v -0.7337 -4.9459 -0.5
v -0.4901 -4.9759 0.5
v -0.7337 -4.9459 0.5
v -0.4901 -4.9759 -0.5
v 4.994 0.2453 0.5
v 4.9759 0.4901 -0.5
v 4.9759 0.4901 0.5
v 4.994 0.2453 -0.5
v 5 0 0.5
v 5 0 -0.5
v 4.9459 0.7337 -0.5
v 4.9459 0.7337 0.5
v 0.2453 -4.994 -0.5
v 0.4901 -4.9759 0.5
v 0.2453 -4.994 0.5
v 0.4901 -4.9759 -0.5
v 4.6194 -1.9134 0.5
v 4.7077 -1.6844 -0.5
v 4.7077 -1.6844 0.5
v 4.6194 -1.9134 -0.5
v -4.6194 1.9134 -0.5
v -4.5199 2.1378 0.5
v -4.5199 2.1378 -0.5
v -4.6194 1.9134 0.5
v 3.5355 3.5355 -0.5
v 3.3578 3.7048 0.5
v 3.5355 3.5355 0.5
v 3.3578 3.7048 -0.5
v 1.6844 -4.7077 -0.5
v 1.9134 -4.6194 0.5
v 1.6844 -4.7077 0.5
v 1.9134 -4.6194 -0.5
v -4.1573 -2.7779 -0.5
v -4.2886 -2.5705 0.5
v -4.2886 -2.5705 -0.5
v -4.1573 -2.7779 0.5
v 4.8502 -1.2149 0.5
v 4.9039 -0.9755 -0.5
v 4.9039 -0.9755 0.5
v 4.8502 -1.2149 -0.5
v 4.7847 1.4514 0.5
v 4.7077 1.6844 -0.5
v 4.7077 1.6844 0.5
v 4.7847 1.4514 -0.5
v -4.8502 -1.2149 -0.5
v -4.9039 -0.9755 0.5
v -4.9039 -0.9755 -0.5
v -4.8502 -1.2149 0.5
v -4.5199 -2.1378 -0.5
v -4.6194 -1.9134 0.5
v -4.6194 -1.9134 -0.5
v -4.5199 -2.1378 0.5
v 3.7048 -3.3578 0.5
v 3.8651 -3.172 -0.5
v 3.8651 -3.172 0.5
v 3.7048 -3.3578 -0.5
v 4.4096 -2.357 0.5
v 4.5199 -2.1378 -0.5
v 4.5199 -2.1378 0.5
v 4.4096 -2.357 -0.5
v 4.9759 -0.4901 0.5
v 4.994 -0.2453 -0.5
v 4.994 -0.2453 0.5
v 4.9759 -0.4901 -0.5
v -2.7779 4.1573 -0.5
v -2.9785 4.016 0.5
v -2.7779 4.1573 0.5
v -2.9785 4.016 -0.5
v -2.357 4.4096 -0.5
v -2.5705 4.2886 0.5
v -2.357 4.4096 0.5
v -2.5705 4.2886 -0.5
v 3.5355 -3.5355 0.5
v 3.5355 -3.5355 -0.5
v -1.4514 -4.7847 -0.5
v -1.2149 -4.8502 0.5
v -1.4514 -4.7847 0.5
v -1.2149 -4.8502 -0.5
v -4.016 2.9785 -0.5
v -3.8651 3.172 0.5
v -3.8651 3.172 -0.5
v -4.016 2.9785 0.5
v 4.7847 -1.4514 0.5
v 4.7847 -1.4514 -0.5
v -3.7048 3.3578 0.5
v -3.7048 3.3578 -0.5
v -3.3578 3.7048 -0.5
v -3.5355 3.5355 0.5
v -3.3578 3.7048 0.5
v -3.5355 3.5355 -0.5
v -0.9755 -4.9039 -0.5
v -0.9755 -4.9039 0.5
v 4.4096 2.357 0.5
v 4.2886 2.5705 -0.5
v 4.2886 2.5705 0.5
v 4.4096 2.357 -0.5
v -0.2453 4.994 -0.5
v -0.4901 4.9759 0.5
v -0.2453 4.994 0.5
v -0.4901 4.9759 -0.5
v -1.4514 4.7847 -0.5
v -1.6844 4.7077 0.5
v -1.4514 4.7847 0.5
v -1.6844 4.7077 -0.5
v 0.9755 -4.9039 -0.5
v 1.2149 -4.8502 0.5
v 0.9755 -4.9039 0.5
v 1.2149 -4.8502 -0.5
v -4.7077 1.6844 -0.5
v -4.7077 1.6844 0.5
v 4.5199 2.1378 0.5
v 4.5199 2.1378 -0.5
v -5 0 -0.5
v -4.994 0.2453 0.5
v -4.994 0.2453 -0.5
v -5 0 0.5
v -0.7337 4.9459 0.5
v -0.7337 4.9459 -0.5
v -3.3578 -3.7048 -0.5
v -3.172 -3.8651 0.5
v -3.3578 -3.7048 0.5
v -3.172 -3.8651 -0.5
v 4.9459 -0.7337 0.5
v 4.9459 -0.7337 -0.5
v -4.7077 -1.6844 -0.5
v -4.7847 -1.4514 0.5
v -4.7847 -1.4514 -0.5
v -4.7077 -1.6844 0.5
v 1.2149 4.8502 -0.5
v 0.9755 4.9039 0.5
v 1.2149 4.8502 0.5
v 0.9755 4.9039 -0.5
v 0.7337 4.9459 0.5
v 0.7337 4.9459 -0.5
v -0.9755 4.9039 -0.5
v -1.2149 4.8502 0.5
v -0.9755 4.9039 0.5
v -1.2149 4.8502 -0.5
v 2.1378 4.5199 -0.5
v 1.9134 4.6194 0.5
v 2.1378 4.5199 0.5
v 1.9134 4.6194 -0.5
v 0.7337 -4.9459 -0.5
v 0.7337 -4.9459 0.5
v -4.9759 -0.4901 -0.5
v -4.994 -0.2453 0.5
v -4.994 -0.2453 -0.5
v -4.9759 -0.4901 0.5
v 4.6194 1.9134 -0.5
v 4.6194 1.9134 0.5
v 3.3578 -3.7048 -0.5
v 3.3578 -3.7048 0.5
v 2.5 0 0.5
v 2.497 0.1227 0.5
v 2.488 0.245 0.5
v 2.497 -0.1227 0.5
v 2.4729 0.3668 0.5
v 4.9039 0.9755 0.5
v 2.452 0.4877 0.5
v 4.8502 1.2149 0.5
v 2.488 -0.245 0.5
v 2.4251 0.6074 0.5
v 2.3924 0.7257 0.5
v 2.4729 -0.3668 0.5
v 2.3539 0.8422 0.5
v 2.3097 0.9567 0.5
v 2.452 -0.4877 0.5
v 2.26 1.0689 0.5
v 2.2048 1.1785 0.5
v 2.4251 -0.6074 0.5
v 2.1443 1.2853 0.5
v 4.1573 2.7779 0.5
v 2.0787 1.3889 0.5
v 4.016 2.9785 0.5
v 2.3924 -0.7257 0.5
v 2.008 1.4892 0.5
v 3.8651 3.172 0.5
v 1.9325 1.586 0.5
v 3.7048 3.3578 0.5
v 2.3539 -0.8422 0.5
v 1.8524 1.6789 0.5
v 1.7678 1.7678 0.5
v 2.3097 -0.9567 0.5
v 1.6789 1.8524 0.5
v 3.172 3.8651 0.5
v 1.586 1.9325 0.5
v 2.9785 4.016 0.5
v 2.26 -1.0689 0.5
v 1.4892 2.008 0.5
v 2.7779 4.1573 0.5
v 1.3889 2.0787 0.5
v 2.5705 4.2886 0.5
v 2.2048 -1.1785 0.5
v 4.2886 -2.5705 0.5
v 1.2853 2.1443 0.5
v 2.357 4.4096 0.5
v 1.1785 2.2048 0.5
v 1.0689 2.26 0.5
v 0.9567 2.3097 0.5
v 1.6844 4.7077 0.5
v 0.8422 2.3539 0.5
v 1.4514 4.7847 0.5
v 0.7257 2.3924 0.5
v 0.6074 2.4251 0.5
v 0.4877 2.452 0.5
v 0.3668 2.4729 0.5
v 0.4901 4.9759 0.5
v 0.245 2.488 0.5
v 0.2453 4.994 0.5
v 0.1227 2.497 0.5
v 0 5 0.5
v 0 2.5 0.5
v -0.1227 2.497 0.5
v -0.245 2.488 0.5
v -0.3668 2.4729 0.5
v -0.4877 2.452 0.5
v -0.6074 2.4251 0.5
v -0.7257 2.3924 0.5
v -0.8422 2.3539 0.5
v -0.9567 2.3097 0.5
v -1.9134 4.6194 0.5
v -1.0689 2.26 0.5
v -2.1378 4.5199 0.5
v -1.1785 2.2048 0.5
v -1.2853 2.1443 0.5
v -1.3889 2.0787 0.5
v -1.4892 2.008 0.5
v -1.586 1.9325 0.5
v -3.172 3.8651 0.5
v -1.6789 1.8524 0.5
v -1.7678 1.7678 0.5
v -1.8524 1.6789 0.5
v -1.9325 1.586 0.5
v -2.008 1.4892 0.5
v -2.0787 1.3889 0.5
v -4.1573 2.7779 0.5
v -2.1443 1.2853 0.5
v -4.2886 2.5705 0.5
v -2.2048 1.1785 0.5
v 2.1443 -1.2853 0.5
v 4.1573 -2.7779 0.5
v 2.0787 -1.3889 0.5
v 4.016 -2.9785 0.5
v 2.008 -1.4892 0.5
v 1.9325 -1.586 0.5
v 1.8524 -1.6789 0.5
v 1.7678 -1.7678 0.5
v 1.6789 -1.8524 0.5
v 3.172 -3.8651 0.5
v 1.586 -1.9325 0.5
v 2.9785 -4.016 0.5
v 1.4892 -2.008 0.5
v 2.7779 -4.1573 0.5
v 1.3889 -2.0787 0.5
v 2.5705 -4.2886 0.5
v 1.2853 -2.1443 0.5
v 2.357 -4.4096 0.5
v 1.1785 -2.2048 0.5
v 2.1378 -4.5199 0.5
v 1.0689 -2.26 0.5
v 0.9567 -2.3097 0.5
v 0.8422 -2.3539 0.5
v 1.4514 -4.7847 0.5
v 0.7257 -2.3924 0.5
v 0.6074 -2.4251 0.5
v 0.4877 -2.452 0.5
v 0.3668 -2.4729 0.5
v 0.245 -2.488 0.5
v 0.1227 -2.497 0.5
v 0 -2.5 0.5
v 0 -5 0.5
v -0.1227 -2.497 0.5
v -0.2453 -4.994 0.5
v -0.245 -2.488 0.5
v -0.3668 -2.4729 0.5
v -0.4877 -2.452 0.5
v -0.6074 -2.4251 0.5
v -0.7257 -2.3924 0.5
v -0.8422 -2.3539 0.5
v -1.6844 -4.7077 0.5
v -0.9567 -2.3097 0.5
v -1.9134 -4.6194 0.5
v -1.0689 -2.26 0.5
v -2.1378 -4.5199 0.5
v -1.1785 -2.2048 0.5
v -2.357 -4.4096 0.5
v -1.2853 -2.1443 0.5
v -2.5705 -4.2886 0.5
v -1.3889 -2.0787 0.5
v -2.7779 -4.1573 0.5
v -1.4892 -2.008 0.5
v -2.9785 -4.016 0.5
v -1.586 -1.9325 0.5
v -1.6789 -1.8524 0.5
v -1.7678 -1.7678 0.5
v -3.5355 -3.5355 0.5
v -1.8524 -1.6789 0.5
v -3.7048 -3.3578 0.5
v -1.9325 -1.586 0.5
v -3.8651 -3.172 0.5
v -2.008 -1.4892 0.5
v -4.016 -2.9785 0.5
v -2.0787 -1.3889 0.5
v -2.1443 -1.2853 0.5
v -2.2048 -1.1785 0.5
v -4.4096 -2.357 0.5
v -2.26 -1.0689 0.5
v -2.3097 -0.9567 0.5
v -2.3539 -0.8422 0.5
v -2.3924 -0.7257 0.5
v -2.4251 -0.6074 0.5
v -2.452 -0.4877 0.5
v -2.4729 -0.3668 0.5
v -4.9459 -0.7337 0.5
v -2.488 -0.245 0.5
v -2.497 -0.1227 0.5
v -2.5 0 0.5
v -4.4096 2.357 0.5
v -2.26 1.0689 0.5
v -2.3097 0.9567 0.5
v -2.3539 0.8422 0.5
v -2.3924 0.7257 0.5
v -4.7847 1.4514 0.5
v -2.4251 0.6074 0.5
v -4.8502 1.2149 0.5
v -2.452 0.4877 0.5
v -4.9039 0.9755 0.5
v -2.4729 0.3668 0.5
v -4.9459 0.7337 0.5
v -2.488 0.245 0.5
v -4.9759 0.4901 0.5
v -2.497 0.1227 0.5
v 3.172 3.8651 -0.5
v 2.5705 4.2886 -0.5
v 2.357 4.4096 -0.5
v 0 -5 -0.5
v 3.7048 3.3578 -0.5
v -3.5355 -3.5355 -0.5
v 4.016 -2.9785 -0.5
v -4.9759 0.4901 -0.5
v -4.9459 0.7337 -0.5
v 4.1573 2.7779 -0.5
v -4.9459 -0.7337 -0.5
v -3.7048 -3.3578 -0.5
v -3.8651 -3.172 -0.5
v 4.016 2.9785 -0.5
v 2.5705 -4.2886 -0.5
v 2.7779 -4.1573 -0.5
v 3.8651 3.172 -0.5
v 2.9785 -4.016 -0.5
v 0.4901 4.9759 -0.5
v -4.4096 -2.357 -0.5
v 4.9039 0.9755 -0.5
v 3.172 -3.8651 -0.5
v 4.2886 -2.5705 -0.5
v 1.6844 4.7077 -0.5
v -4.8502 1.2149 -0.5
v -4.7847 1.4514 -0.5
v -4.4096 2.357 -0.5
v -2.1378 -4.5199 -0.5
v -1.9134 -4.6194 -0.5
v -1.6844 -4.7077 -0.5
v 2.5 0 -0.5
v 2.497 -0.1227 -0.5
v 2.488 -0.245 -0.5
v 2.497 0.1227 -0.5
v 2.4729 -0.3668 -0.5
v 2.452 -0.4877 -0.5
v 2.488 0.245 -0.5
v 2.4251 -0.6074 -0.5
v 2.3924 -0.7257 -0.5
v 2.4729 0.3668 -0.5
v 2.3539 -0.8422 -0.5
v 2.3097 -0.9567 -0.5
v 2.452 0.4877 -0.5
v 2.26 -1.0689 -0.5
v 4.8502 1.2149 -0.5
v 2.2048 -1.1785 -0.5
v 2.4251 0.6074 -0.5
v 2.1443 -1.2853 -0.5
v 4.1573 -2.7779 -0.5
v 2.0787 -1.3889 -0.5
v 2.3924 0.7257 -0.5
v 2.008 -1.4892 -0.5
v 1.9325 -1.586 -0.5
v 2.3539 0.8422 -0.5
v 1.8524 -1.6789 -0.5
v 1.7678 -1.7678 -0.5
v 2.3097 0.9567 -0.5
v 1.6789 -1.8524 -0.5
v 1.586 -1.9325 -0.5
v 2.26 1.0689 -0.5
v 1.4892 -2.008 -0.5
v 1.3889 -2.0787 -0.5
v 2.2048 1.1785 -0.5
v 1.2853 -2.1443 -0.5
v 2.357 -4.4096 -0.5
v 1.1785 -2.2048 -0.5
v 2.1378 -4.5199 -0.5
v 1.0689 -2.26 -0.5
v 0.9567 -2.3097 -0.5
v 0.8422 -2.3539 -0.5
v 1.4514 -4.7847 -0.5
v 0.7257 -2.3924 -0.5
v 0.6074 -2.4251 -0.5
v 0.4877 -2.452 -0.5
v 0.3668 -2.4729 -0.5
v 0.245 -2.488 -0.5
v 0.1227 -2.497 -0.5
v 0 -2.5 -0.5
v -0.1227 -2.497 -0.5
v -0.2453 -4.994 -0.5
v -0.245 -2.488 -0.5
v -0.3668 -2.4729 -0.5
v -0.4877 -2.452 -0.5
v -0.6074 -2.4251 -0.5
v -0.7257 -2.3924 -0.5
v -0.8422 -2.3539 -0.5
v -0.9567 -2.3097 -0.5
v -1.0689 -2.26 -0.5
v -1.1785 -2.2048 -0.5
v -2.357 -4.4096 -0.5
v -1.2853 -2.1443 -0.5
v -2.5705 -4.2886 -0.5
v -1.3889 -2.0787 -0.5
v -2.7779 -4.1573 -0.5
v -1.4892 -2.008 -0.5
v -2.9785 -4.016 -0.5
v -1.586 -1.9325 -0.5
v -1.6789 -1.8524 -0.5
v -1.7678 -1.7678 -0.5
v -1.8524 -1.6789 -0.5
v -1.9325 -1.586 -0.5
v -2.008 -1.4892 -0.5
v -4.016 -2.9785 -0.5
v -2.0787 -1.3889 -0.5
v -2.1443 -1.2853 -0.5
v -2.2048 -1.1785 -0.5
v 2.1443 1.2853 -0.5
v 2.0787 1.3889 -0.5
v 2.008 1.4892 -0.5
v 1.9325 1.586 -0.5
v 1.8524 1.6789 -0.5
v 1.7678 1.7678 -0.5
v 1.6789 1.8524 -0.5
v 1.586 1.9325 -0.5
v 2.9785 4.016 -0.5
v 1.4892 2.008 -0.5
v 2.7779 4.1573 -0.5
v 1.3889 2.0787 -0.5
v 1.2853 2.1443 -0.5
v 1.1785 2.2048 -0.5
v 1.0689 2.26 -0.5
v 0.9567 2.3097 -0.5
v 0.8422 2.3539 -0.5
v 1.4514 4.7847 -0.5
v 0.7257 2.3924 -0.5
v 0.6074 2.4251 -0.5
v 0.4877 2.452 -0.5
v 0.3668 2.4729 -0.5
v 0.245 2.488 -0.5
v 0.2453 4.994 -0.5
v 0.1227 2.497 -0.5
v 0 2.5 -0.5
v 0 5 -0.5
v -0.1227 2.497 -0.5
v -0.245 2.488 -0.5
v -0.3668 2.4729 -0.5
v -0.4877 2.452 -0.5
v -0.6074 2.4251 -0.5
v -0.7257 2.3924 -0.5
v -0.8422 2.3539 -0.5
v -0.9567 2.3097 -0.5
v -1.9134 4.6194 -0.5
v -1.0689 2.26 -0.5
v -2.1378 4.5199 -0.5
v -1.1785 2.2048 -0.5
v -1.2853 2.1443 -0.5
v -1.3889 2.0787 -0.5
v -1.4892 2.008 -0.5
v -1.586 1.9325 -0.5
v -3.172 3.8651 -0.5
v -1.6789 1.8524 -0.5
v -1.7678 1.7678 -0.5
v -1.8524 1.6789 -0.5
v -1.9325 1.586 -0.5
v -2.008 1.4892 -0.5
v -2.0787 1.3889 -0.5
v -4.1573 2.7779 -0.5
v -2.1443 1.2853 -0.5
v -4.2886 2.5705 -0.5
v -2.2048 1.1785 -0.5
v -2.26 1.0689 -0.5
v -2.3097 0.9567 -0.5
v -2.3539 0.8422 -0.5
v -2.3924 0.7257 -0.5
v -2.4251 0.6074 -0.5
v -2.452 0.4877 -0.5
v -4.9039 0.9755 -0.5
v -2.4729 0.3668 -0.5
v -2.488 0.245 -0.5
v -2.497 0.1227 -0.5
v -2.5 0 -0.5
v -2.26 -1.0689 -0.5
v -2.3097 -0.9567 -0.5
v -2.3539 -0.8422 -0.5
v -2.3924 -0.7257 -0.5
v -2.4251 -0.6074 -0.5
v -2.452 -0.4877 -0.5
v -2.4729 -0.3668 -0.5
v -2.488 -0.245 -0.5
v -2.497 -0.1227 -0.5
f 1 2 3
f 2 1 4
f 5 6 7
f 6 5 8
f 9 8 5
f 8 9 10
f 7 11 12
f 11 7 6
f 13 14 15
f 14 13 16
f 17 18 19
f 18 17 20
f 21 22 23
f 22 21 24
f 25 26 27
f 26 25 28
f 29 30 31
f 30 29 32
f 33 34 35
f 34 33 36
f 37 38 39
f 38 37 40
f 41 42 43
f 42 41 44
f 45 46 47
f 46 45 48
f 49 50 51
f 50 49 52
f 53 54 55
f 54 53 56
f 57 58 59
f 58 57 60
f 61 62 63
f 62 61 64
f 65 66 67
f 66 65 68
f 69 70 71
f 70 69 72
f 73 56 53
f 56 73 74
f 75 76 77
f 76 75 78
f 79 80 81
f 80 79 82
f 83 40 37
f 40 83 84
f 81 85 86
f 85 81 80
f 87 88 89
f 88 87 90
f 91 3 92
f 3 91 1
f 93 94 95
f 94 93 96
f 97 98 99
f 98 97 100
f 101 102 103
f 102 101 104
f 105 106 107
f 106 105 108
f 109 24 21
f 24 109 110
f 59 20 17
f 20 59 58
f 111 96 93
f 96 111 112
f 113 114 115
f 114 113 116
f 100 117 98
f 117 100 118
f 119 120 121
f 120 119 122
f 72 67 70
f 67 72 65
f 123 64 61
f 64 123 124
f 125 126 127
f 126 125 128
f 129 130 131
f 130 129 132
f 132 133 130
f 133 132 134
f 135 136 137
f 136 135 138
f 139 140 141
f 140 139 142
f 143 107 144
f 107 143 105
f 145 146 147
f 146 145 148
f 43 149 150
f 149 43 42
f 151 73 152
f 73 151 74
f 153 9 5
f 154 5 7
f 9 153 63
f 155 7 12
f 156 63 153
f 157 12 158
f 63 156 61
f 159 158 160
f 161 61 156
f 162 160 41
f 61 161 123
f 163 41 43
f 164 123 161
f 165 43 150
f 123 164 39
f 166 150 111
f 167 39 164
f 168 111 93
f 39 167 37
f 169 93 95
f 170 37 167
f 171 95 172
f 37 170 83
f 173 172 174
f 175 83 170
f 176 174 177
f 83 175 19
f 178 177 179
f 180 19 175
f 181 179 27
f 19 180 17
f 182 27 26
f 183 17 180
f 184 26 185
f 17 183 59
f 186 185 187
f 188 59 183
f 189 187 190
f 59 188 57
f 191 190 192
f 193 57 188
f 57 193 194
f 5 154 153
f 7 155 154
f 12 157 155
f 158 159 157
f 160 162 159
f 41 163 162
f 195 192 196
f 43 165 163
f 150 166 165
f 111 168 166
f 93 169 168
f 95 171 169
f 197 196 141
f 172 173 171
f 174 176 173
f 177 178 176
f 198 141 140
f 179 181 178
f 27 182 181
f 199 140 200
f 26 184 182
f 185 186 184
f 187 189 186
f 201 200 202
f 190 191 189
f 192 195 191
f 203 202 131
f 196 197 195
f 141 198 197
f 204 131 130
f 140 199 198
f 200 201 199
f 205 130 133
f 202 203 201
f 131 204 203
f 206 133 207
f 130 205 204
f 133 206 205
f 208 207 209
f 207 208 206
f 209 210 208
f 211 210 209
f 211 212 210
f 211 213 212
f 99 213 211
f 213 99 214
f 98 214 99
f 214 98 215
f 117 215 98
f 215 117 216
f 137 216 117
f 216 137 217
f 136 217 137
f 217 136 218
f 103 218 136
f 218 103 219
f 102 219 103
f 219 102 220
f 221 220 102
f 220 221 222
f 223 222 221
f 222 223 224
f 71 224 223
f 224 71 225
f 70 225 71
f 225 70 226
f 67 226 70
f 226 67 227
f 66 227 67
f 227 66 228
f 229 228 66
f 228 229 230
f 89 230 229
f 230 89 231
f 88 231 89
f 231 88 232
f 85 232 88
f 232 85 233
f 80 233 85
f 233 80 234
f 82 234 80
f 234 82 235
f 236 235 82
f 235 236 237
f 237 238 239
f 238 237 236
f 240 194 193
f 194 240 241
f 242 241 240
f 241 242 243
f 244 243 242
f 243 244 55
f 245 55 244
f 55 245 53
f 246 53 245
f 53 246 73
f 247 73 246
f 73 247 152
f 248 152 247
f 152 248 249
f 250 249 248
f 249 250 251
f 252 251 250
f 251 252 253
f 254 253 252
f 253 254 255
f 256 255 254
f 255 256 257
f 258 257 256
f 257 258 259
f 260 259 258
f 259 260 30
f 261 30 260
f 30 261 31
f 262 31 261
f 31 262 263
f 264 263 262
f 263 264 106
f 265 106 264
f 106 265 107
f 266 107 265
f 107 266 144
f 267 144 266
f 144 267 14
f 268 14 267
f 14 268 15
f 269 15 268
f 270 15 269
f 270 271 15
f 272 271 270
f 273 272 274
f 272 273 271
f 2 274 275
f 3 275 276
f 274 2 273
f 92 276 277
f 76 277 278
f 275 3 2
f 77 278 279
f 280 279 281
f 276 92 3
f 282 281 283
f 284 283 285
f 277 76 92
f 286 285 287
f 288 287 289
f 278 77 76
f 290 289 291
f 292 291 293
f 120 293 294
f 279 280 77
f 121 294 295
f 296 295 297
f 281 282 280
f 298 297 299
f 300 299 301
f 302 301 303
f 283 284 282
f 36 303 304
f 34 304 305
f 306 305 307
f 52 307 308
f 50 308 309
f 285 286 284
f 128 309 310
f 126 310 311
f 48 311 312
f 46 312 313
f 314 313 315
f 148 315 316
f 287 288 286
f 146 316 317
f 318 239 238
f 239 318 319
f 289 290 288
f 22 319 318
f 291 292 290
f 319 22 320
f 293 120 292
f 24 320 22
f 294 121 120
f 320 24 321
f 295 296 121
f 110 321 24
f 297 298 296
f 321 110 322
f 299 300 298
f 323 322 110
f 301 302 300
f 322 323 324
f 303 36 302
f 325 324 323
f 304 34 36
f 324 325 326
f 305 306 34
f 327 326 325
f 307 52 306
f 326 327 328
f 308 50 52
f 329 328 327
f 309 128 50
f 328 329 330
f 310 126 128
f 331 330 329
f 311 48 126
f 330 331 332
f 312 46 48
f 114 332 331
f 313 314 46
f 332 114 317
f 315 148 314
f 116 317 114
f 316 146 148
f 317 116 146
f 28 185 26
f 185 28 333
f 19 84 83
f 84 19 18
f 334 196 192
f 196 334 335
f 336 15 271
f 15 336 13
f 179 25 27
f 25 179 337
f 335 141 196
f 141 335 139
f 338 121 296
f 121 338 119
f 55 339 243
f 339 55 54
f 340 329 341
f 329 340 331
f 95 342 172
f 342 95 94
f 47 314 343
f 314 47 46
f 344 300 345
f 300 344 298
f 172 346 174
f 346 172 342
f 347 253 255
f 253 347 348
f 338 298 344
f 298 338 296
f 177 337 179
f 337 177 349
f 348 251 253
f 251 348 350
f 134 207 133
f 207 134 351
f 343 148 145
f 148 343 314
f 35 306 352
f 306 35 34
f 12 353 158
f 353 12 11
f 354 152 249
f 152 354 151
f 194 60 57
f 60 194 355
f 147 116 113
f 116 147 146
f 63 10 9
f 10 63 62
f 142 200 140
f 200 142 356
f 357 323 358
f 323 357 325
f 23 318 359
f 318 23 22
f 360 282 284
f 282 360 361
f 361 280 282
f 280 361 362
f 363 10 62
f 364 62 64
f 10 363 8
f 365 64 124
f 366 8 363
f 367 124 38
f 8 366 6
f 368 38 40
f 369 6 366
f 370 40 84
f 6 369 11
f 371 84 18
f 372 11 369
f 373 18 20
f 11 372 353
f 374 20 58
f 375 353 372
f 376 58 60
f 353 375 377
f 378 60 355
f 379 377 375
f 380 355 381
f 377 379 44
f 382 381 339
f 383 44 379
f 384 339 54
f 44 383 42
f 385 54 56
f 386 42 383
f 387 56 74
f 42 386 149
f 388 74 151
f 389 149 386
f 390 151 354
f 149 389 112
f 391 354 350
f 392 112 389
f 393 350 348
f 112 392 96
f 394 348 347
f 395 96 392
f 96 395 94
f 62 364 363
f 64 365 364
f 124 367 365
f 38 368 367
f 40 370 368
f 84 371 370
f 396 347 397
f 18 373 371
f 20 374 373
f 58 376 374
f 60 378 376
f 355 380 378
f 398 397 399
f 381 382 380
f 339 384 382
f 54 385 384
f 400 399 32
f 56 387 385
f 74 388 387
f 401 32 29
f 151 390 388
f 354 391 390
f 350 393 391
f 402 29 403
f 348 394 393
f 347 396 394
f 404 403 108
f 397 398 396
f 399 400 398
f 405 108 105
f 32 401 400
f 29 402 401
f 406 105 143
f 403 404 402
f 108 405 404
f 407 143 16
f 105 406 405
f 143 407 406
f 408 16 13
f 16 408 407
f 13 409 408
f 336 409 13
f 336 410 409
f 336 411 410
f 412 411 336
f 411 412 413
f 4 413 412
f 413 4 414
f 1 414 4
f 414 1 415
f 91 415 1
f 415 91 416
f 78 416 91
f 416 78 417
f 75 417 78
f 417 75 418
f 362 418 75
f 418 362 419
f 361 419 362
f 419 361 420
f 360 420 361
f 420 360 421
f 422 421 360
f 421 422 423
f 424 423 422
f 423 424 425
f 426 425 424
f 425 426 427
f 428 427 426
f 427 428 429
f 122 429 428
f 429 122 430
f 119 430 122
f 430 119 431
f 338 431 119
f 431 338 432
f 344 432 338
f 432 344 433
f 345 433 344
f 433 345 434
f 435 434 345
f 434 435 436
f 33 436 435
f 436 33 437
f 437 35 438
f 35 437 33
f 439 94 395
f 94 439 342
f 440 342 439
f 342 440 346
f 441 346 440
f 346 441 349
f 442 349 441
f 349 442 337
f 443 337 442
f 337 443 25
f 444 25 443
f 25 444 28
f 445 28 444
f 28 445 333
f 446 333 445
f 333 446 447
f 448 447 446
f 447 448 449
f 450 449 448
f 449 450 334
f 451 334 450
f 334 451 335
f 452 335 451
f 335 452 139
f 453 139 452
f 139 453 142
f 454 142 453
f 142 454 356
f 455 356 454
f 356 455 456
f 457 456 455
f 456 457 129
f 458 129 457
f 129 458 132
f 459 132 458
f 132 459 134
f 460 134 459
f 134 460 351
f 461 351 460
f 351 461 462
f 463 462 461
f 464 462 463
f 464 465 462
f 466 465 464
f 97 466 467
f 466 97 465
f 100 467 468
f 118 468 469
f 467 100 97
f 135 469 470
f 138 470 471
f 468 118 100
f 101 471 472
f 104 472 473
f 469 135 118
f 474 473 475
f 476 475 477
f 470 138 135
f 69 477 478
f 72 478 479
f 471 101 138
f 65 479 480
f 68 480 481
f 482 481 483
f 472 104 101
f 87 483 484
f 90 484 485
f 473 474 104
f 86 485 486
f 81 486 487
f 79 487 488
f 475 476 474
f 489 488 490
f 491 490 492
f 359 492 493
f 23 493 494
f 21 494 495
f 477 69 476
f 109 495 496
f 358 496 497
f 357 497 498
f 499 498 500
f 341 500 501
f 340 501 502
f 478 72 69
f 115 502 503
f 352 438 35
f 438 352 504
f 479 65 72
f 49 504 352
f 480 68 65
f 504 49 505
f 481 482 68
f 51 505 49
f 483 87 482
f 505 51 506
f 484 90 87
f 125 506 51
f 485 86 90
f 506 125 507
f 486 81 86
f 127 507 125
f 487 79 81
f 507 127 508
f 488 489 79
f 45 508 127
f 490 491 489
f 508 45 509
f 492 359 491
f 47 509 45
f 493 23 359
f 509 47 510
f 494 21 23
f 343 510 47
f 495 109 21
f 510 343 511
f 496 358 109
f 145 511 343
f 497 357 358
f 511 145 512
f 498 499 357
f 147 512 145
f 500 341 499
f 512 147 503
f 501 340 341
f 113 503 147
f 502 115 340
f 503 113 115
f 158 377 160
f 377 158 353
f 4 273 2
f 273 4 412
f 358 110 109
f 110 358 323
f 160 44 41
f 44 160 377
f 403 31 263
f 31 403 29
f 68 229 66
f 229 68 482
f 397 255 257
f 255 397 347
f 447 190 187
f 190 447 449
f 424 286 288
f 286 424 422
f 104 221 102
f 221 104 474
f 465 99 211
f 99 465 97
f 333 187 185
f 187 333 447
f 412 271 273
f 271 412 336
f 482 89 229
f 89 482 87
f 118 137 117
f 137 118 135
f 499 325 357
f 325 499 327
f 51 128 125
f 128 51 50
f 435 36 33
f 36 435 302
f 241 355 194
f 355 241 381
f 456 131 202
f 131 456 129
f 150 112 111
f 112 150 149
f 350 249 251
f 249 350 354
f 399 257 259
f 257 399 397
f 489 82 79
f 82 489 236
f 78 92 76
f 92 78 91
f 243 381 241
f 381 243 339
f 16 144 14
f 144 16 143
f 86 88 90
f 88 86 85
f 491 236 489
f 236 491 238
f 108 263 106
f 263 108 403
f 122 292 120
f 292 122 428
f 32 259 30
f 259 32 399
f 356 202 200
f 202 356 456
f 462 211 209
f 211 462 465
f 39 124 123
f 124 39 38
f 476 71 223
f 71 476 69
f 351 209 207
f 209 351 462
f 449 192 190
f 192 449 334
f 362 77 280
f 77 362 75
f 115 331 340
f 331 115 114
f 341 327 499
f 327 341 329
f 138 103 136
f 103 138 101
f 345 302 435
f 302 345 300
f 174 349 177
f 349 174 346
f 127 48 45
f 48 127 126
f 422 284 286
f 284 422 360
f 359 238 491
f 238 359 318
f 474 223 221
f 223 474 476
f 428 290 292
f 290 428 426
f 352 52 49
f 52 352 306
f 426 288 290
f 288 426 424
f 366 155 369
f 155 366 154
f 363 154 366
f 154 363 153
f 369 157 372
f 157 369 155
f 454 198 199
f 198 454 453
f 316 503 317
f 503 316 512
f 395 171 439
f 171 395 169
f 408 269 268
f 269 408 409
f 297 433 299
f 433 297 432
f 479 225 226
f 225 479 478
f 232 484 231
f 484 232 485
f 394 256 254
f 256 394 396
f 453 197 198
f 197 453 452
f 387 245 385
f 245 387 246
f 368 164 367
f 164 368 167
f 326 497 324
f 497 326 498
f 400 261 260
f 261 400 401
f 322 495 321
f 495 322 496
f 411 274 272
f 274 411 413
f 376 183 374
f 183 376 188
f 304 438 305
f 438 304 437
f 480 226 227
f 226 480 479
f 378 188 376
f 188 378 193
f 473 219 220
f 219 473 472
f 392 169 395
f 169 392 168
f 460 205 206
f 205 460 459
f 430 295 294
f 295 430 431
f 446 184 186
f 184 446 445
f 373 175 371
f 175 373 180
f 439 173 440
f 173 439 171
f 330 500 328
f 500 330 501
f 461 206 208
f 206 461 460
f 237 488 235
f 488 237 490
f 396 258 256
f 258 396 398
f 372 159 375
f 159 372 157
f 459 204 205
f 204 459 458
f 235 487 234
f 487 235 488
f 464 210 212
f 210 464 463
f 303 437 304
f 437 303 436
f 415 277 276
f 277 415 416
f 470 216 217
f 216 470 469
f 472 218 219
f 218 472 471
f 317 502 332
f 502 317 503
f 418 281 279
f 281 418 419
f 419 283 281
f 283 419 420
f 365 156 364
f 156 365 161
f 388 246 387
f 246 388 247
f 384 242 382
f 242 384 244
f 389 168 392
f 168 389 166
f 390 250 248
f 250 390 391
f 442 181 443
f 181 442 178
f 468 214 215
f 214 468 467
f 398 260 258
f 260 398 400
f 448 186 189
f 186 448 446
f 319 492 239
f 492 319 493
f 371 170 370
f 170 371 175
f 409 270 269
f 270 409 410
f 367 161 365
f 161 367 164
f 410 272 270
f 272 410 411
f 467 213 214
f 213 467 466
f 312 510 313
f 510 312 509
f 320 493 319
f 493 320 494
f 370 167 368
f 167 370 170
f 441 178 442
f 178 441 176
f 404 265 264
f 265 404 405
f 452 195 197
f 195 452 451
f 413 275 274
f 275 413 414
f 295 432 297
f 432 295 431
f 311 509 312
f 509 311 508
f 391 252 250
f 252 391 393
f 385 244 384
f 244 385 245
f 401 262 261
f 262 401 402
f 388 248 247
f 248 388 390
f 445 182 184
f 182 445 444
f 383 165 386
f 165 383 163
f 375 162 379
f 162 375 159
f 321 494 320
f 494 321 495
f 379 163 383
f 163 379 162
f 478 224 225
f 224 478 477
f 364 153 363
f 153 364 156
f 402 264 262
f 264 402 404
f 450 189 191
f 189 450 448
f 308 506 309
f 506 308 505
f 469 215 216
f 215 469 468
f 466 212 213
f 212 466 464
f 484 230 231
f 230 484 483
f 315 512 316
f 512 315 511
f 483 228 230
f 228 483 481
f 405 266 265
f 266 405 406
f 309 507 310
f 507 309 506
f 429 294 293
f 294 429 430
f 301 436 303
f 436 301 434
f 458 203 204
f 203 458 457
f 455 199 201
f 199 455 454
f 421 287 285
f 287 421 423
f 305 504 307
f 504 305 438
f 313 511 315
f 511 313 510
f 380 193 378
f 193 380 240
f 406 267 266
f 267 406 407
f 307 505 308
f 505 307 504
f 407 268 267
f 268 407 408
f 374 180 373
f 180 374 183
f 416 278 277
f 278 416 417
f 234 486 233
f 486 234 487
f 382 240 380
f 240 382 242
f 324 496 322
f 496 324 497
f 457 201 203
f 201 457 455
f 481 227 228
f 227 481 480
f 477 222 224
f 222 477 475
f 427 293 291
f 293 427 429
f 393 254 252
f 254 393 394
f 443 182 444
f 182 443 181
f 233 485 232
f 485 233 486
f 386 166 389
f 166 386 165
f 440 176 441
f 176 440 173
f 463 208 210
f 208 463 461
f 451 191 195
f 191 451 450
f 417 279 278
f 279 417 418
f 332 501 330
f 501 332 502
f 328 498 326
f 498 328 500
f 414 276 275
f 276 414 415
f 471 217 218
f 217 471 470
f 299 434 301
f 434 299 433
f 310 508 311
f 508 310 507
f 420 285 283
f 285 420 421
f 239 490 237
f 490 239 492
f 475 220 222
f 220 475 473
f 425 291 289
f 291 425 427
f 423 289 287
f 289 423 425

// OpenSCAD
$fn = 128;

module washer(id=5.0, od=10.0, t=1.0) {
    difference() {
        cylinder(h=t, d=od, center=true);
        cylinder(h=t + 0.2, d=id, center=true);
    }
}

washer();
